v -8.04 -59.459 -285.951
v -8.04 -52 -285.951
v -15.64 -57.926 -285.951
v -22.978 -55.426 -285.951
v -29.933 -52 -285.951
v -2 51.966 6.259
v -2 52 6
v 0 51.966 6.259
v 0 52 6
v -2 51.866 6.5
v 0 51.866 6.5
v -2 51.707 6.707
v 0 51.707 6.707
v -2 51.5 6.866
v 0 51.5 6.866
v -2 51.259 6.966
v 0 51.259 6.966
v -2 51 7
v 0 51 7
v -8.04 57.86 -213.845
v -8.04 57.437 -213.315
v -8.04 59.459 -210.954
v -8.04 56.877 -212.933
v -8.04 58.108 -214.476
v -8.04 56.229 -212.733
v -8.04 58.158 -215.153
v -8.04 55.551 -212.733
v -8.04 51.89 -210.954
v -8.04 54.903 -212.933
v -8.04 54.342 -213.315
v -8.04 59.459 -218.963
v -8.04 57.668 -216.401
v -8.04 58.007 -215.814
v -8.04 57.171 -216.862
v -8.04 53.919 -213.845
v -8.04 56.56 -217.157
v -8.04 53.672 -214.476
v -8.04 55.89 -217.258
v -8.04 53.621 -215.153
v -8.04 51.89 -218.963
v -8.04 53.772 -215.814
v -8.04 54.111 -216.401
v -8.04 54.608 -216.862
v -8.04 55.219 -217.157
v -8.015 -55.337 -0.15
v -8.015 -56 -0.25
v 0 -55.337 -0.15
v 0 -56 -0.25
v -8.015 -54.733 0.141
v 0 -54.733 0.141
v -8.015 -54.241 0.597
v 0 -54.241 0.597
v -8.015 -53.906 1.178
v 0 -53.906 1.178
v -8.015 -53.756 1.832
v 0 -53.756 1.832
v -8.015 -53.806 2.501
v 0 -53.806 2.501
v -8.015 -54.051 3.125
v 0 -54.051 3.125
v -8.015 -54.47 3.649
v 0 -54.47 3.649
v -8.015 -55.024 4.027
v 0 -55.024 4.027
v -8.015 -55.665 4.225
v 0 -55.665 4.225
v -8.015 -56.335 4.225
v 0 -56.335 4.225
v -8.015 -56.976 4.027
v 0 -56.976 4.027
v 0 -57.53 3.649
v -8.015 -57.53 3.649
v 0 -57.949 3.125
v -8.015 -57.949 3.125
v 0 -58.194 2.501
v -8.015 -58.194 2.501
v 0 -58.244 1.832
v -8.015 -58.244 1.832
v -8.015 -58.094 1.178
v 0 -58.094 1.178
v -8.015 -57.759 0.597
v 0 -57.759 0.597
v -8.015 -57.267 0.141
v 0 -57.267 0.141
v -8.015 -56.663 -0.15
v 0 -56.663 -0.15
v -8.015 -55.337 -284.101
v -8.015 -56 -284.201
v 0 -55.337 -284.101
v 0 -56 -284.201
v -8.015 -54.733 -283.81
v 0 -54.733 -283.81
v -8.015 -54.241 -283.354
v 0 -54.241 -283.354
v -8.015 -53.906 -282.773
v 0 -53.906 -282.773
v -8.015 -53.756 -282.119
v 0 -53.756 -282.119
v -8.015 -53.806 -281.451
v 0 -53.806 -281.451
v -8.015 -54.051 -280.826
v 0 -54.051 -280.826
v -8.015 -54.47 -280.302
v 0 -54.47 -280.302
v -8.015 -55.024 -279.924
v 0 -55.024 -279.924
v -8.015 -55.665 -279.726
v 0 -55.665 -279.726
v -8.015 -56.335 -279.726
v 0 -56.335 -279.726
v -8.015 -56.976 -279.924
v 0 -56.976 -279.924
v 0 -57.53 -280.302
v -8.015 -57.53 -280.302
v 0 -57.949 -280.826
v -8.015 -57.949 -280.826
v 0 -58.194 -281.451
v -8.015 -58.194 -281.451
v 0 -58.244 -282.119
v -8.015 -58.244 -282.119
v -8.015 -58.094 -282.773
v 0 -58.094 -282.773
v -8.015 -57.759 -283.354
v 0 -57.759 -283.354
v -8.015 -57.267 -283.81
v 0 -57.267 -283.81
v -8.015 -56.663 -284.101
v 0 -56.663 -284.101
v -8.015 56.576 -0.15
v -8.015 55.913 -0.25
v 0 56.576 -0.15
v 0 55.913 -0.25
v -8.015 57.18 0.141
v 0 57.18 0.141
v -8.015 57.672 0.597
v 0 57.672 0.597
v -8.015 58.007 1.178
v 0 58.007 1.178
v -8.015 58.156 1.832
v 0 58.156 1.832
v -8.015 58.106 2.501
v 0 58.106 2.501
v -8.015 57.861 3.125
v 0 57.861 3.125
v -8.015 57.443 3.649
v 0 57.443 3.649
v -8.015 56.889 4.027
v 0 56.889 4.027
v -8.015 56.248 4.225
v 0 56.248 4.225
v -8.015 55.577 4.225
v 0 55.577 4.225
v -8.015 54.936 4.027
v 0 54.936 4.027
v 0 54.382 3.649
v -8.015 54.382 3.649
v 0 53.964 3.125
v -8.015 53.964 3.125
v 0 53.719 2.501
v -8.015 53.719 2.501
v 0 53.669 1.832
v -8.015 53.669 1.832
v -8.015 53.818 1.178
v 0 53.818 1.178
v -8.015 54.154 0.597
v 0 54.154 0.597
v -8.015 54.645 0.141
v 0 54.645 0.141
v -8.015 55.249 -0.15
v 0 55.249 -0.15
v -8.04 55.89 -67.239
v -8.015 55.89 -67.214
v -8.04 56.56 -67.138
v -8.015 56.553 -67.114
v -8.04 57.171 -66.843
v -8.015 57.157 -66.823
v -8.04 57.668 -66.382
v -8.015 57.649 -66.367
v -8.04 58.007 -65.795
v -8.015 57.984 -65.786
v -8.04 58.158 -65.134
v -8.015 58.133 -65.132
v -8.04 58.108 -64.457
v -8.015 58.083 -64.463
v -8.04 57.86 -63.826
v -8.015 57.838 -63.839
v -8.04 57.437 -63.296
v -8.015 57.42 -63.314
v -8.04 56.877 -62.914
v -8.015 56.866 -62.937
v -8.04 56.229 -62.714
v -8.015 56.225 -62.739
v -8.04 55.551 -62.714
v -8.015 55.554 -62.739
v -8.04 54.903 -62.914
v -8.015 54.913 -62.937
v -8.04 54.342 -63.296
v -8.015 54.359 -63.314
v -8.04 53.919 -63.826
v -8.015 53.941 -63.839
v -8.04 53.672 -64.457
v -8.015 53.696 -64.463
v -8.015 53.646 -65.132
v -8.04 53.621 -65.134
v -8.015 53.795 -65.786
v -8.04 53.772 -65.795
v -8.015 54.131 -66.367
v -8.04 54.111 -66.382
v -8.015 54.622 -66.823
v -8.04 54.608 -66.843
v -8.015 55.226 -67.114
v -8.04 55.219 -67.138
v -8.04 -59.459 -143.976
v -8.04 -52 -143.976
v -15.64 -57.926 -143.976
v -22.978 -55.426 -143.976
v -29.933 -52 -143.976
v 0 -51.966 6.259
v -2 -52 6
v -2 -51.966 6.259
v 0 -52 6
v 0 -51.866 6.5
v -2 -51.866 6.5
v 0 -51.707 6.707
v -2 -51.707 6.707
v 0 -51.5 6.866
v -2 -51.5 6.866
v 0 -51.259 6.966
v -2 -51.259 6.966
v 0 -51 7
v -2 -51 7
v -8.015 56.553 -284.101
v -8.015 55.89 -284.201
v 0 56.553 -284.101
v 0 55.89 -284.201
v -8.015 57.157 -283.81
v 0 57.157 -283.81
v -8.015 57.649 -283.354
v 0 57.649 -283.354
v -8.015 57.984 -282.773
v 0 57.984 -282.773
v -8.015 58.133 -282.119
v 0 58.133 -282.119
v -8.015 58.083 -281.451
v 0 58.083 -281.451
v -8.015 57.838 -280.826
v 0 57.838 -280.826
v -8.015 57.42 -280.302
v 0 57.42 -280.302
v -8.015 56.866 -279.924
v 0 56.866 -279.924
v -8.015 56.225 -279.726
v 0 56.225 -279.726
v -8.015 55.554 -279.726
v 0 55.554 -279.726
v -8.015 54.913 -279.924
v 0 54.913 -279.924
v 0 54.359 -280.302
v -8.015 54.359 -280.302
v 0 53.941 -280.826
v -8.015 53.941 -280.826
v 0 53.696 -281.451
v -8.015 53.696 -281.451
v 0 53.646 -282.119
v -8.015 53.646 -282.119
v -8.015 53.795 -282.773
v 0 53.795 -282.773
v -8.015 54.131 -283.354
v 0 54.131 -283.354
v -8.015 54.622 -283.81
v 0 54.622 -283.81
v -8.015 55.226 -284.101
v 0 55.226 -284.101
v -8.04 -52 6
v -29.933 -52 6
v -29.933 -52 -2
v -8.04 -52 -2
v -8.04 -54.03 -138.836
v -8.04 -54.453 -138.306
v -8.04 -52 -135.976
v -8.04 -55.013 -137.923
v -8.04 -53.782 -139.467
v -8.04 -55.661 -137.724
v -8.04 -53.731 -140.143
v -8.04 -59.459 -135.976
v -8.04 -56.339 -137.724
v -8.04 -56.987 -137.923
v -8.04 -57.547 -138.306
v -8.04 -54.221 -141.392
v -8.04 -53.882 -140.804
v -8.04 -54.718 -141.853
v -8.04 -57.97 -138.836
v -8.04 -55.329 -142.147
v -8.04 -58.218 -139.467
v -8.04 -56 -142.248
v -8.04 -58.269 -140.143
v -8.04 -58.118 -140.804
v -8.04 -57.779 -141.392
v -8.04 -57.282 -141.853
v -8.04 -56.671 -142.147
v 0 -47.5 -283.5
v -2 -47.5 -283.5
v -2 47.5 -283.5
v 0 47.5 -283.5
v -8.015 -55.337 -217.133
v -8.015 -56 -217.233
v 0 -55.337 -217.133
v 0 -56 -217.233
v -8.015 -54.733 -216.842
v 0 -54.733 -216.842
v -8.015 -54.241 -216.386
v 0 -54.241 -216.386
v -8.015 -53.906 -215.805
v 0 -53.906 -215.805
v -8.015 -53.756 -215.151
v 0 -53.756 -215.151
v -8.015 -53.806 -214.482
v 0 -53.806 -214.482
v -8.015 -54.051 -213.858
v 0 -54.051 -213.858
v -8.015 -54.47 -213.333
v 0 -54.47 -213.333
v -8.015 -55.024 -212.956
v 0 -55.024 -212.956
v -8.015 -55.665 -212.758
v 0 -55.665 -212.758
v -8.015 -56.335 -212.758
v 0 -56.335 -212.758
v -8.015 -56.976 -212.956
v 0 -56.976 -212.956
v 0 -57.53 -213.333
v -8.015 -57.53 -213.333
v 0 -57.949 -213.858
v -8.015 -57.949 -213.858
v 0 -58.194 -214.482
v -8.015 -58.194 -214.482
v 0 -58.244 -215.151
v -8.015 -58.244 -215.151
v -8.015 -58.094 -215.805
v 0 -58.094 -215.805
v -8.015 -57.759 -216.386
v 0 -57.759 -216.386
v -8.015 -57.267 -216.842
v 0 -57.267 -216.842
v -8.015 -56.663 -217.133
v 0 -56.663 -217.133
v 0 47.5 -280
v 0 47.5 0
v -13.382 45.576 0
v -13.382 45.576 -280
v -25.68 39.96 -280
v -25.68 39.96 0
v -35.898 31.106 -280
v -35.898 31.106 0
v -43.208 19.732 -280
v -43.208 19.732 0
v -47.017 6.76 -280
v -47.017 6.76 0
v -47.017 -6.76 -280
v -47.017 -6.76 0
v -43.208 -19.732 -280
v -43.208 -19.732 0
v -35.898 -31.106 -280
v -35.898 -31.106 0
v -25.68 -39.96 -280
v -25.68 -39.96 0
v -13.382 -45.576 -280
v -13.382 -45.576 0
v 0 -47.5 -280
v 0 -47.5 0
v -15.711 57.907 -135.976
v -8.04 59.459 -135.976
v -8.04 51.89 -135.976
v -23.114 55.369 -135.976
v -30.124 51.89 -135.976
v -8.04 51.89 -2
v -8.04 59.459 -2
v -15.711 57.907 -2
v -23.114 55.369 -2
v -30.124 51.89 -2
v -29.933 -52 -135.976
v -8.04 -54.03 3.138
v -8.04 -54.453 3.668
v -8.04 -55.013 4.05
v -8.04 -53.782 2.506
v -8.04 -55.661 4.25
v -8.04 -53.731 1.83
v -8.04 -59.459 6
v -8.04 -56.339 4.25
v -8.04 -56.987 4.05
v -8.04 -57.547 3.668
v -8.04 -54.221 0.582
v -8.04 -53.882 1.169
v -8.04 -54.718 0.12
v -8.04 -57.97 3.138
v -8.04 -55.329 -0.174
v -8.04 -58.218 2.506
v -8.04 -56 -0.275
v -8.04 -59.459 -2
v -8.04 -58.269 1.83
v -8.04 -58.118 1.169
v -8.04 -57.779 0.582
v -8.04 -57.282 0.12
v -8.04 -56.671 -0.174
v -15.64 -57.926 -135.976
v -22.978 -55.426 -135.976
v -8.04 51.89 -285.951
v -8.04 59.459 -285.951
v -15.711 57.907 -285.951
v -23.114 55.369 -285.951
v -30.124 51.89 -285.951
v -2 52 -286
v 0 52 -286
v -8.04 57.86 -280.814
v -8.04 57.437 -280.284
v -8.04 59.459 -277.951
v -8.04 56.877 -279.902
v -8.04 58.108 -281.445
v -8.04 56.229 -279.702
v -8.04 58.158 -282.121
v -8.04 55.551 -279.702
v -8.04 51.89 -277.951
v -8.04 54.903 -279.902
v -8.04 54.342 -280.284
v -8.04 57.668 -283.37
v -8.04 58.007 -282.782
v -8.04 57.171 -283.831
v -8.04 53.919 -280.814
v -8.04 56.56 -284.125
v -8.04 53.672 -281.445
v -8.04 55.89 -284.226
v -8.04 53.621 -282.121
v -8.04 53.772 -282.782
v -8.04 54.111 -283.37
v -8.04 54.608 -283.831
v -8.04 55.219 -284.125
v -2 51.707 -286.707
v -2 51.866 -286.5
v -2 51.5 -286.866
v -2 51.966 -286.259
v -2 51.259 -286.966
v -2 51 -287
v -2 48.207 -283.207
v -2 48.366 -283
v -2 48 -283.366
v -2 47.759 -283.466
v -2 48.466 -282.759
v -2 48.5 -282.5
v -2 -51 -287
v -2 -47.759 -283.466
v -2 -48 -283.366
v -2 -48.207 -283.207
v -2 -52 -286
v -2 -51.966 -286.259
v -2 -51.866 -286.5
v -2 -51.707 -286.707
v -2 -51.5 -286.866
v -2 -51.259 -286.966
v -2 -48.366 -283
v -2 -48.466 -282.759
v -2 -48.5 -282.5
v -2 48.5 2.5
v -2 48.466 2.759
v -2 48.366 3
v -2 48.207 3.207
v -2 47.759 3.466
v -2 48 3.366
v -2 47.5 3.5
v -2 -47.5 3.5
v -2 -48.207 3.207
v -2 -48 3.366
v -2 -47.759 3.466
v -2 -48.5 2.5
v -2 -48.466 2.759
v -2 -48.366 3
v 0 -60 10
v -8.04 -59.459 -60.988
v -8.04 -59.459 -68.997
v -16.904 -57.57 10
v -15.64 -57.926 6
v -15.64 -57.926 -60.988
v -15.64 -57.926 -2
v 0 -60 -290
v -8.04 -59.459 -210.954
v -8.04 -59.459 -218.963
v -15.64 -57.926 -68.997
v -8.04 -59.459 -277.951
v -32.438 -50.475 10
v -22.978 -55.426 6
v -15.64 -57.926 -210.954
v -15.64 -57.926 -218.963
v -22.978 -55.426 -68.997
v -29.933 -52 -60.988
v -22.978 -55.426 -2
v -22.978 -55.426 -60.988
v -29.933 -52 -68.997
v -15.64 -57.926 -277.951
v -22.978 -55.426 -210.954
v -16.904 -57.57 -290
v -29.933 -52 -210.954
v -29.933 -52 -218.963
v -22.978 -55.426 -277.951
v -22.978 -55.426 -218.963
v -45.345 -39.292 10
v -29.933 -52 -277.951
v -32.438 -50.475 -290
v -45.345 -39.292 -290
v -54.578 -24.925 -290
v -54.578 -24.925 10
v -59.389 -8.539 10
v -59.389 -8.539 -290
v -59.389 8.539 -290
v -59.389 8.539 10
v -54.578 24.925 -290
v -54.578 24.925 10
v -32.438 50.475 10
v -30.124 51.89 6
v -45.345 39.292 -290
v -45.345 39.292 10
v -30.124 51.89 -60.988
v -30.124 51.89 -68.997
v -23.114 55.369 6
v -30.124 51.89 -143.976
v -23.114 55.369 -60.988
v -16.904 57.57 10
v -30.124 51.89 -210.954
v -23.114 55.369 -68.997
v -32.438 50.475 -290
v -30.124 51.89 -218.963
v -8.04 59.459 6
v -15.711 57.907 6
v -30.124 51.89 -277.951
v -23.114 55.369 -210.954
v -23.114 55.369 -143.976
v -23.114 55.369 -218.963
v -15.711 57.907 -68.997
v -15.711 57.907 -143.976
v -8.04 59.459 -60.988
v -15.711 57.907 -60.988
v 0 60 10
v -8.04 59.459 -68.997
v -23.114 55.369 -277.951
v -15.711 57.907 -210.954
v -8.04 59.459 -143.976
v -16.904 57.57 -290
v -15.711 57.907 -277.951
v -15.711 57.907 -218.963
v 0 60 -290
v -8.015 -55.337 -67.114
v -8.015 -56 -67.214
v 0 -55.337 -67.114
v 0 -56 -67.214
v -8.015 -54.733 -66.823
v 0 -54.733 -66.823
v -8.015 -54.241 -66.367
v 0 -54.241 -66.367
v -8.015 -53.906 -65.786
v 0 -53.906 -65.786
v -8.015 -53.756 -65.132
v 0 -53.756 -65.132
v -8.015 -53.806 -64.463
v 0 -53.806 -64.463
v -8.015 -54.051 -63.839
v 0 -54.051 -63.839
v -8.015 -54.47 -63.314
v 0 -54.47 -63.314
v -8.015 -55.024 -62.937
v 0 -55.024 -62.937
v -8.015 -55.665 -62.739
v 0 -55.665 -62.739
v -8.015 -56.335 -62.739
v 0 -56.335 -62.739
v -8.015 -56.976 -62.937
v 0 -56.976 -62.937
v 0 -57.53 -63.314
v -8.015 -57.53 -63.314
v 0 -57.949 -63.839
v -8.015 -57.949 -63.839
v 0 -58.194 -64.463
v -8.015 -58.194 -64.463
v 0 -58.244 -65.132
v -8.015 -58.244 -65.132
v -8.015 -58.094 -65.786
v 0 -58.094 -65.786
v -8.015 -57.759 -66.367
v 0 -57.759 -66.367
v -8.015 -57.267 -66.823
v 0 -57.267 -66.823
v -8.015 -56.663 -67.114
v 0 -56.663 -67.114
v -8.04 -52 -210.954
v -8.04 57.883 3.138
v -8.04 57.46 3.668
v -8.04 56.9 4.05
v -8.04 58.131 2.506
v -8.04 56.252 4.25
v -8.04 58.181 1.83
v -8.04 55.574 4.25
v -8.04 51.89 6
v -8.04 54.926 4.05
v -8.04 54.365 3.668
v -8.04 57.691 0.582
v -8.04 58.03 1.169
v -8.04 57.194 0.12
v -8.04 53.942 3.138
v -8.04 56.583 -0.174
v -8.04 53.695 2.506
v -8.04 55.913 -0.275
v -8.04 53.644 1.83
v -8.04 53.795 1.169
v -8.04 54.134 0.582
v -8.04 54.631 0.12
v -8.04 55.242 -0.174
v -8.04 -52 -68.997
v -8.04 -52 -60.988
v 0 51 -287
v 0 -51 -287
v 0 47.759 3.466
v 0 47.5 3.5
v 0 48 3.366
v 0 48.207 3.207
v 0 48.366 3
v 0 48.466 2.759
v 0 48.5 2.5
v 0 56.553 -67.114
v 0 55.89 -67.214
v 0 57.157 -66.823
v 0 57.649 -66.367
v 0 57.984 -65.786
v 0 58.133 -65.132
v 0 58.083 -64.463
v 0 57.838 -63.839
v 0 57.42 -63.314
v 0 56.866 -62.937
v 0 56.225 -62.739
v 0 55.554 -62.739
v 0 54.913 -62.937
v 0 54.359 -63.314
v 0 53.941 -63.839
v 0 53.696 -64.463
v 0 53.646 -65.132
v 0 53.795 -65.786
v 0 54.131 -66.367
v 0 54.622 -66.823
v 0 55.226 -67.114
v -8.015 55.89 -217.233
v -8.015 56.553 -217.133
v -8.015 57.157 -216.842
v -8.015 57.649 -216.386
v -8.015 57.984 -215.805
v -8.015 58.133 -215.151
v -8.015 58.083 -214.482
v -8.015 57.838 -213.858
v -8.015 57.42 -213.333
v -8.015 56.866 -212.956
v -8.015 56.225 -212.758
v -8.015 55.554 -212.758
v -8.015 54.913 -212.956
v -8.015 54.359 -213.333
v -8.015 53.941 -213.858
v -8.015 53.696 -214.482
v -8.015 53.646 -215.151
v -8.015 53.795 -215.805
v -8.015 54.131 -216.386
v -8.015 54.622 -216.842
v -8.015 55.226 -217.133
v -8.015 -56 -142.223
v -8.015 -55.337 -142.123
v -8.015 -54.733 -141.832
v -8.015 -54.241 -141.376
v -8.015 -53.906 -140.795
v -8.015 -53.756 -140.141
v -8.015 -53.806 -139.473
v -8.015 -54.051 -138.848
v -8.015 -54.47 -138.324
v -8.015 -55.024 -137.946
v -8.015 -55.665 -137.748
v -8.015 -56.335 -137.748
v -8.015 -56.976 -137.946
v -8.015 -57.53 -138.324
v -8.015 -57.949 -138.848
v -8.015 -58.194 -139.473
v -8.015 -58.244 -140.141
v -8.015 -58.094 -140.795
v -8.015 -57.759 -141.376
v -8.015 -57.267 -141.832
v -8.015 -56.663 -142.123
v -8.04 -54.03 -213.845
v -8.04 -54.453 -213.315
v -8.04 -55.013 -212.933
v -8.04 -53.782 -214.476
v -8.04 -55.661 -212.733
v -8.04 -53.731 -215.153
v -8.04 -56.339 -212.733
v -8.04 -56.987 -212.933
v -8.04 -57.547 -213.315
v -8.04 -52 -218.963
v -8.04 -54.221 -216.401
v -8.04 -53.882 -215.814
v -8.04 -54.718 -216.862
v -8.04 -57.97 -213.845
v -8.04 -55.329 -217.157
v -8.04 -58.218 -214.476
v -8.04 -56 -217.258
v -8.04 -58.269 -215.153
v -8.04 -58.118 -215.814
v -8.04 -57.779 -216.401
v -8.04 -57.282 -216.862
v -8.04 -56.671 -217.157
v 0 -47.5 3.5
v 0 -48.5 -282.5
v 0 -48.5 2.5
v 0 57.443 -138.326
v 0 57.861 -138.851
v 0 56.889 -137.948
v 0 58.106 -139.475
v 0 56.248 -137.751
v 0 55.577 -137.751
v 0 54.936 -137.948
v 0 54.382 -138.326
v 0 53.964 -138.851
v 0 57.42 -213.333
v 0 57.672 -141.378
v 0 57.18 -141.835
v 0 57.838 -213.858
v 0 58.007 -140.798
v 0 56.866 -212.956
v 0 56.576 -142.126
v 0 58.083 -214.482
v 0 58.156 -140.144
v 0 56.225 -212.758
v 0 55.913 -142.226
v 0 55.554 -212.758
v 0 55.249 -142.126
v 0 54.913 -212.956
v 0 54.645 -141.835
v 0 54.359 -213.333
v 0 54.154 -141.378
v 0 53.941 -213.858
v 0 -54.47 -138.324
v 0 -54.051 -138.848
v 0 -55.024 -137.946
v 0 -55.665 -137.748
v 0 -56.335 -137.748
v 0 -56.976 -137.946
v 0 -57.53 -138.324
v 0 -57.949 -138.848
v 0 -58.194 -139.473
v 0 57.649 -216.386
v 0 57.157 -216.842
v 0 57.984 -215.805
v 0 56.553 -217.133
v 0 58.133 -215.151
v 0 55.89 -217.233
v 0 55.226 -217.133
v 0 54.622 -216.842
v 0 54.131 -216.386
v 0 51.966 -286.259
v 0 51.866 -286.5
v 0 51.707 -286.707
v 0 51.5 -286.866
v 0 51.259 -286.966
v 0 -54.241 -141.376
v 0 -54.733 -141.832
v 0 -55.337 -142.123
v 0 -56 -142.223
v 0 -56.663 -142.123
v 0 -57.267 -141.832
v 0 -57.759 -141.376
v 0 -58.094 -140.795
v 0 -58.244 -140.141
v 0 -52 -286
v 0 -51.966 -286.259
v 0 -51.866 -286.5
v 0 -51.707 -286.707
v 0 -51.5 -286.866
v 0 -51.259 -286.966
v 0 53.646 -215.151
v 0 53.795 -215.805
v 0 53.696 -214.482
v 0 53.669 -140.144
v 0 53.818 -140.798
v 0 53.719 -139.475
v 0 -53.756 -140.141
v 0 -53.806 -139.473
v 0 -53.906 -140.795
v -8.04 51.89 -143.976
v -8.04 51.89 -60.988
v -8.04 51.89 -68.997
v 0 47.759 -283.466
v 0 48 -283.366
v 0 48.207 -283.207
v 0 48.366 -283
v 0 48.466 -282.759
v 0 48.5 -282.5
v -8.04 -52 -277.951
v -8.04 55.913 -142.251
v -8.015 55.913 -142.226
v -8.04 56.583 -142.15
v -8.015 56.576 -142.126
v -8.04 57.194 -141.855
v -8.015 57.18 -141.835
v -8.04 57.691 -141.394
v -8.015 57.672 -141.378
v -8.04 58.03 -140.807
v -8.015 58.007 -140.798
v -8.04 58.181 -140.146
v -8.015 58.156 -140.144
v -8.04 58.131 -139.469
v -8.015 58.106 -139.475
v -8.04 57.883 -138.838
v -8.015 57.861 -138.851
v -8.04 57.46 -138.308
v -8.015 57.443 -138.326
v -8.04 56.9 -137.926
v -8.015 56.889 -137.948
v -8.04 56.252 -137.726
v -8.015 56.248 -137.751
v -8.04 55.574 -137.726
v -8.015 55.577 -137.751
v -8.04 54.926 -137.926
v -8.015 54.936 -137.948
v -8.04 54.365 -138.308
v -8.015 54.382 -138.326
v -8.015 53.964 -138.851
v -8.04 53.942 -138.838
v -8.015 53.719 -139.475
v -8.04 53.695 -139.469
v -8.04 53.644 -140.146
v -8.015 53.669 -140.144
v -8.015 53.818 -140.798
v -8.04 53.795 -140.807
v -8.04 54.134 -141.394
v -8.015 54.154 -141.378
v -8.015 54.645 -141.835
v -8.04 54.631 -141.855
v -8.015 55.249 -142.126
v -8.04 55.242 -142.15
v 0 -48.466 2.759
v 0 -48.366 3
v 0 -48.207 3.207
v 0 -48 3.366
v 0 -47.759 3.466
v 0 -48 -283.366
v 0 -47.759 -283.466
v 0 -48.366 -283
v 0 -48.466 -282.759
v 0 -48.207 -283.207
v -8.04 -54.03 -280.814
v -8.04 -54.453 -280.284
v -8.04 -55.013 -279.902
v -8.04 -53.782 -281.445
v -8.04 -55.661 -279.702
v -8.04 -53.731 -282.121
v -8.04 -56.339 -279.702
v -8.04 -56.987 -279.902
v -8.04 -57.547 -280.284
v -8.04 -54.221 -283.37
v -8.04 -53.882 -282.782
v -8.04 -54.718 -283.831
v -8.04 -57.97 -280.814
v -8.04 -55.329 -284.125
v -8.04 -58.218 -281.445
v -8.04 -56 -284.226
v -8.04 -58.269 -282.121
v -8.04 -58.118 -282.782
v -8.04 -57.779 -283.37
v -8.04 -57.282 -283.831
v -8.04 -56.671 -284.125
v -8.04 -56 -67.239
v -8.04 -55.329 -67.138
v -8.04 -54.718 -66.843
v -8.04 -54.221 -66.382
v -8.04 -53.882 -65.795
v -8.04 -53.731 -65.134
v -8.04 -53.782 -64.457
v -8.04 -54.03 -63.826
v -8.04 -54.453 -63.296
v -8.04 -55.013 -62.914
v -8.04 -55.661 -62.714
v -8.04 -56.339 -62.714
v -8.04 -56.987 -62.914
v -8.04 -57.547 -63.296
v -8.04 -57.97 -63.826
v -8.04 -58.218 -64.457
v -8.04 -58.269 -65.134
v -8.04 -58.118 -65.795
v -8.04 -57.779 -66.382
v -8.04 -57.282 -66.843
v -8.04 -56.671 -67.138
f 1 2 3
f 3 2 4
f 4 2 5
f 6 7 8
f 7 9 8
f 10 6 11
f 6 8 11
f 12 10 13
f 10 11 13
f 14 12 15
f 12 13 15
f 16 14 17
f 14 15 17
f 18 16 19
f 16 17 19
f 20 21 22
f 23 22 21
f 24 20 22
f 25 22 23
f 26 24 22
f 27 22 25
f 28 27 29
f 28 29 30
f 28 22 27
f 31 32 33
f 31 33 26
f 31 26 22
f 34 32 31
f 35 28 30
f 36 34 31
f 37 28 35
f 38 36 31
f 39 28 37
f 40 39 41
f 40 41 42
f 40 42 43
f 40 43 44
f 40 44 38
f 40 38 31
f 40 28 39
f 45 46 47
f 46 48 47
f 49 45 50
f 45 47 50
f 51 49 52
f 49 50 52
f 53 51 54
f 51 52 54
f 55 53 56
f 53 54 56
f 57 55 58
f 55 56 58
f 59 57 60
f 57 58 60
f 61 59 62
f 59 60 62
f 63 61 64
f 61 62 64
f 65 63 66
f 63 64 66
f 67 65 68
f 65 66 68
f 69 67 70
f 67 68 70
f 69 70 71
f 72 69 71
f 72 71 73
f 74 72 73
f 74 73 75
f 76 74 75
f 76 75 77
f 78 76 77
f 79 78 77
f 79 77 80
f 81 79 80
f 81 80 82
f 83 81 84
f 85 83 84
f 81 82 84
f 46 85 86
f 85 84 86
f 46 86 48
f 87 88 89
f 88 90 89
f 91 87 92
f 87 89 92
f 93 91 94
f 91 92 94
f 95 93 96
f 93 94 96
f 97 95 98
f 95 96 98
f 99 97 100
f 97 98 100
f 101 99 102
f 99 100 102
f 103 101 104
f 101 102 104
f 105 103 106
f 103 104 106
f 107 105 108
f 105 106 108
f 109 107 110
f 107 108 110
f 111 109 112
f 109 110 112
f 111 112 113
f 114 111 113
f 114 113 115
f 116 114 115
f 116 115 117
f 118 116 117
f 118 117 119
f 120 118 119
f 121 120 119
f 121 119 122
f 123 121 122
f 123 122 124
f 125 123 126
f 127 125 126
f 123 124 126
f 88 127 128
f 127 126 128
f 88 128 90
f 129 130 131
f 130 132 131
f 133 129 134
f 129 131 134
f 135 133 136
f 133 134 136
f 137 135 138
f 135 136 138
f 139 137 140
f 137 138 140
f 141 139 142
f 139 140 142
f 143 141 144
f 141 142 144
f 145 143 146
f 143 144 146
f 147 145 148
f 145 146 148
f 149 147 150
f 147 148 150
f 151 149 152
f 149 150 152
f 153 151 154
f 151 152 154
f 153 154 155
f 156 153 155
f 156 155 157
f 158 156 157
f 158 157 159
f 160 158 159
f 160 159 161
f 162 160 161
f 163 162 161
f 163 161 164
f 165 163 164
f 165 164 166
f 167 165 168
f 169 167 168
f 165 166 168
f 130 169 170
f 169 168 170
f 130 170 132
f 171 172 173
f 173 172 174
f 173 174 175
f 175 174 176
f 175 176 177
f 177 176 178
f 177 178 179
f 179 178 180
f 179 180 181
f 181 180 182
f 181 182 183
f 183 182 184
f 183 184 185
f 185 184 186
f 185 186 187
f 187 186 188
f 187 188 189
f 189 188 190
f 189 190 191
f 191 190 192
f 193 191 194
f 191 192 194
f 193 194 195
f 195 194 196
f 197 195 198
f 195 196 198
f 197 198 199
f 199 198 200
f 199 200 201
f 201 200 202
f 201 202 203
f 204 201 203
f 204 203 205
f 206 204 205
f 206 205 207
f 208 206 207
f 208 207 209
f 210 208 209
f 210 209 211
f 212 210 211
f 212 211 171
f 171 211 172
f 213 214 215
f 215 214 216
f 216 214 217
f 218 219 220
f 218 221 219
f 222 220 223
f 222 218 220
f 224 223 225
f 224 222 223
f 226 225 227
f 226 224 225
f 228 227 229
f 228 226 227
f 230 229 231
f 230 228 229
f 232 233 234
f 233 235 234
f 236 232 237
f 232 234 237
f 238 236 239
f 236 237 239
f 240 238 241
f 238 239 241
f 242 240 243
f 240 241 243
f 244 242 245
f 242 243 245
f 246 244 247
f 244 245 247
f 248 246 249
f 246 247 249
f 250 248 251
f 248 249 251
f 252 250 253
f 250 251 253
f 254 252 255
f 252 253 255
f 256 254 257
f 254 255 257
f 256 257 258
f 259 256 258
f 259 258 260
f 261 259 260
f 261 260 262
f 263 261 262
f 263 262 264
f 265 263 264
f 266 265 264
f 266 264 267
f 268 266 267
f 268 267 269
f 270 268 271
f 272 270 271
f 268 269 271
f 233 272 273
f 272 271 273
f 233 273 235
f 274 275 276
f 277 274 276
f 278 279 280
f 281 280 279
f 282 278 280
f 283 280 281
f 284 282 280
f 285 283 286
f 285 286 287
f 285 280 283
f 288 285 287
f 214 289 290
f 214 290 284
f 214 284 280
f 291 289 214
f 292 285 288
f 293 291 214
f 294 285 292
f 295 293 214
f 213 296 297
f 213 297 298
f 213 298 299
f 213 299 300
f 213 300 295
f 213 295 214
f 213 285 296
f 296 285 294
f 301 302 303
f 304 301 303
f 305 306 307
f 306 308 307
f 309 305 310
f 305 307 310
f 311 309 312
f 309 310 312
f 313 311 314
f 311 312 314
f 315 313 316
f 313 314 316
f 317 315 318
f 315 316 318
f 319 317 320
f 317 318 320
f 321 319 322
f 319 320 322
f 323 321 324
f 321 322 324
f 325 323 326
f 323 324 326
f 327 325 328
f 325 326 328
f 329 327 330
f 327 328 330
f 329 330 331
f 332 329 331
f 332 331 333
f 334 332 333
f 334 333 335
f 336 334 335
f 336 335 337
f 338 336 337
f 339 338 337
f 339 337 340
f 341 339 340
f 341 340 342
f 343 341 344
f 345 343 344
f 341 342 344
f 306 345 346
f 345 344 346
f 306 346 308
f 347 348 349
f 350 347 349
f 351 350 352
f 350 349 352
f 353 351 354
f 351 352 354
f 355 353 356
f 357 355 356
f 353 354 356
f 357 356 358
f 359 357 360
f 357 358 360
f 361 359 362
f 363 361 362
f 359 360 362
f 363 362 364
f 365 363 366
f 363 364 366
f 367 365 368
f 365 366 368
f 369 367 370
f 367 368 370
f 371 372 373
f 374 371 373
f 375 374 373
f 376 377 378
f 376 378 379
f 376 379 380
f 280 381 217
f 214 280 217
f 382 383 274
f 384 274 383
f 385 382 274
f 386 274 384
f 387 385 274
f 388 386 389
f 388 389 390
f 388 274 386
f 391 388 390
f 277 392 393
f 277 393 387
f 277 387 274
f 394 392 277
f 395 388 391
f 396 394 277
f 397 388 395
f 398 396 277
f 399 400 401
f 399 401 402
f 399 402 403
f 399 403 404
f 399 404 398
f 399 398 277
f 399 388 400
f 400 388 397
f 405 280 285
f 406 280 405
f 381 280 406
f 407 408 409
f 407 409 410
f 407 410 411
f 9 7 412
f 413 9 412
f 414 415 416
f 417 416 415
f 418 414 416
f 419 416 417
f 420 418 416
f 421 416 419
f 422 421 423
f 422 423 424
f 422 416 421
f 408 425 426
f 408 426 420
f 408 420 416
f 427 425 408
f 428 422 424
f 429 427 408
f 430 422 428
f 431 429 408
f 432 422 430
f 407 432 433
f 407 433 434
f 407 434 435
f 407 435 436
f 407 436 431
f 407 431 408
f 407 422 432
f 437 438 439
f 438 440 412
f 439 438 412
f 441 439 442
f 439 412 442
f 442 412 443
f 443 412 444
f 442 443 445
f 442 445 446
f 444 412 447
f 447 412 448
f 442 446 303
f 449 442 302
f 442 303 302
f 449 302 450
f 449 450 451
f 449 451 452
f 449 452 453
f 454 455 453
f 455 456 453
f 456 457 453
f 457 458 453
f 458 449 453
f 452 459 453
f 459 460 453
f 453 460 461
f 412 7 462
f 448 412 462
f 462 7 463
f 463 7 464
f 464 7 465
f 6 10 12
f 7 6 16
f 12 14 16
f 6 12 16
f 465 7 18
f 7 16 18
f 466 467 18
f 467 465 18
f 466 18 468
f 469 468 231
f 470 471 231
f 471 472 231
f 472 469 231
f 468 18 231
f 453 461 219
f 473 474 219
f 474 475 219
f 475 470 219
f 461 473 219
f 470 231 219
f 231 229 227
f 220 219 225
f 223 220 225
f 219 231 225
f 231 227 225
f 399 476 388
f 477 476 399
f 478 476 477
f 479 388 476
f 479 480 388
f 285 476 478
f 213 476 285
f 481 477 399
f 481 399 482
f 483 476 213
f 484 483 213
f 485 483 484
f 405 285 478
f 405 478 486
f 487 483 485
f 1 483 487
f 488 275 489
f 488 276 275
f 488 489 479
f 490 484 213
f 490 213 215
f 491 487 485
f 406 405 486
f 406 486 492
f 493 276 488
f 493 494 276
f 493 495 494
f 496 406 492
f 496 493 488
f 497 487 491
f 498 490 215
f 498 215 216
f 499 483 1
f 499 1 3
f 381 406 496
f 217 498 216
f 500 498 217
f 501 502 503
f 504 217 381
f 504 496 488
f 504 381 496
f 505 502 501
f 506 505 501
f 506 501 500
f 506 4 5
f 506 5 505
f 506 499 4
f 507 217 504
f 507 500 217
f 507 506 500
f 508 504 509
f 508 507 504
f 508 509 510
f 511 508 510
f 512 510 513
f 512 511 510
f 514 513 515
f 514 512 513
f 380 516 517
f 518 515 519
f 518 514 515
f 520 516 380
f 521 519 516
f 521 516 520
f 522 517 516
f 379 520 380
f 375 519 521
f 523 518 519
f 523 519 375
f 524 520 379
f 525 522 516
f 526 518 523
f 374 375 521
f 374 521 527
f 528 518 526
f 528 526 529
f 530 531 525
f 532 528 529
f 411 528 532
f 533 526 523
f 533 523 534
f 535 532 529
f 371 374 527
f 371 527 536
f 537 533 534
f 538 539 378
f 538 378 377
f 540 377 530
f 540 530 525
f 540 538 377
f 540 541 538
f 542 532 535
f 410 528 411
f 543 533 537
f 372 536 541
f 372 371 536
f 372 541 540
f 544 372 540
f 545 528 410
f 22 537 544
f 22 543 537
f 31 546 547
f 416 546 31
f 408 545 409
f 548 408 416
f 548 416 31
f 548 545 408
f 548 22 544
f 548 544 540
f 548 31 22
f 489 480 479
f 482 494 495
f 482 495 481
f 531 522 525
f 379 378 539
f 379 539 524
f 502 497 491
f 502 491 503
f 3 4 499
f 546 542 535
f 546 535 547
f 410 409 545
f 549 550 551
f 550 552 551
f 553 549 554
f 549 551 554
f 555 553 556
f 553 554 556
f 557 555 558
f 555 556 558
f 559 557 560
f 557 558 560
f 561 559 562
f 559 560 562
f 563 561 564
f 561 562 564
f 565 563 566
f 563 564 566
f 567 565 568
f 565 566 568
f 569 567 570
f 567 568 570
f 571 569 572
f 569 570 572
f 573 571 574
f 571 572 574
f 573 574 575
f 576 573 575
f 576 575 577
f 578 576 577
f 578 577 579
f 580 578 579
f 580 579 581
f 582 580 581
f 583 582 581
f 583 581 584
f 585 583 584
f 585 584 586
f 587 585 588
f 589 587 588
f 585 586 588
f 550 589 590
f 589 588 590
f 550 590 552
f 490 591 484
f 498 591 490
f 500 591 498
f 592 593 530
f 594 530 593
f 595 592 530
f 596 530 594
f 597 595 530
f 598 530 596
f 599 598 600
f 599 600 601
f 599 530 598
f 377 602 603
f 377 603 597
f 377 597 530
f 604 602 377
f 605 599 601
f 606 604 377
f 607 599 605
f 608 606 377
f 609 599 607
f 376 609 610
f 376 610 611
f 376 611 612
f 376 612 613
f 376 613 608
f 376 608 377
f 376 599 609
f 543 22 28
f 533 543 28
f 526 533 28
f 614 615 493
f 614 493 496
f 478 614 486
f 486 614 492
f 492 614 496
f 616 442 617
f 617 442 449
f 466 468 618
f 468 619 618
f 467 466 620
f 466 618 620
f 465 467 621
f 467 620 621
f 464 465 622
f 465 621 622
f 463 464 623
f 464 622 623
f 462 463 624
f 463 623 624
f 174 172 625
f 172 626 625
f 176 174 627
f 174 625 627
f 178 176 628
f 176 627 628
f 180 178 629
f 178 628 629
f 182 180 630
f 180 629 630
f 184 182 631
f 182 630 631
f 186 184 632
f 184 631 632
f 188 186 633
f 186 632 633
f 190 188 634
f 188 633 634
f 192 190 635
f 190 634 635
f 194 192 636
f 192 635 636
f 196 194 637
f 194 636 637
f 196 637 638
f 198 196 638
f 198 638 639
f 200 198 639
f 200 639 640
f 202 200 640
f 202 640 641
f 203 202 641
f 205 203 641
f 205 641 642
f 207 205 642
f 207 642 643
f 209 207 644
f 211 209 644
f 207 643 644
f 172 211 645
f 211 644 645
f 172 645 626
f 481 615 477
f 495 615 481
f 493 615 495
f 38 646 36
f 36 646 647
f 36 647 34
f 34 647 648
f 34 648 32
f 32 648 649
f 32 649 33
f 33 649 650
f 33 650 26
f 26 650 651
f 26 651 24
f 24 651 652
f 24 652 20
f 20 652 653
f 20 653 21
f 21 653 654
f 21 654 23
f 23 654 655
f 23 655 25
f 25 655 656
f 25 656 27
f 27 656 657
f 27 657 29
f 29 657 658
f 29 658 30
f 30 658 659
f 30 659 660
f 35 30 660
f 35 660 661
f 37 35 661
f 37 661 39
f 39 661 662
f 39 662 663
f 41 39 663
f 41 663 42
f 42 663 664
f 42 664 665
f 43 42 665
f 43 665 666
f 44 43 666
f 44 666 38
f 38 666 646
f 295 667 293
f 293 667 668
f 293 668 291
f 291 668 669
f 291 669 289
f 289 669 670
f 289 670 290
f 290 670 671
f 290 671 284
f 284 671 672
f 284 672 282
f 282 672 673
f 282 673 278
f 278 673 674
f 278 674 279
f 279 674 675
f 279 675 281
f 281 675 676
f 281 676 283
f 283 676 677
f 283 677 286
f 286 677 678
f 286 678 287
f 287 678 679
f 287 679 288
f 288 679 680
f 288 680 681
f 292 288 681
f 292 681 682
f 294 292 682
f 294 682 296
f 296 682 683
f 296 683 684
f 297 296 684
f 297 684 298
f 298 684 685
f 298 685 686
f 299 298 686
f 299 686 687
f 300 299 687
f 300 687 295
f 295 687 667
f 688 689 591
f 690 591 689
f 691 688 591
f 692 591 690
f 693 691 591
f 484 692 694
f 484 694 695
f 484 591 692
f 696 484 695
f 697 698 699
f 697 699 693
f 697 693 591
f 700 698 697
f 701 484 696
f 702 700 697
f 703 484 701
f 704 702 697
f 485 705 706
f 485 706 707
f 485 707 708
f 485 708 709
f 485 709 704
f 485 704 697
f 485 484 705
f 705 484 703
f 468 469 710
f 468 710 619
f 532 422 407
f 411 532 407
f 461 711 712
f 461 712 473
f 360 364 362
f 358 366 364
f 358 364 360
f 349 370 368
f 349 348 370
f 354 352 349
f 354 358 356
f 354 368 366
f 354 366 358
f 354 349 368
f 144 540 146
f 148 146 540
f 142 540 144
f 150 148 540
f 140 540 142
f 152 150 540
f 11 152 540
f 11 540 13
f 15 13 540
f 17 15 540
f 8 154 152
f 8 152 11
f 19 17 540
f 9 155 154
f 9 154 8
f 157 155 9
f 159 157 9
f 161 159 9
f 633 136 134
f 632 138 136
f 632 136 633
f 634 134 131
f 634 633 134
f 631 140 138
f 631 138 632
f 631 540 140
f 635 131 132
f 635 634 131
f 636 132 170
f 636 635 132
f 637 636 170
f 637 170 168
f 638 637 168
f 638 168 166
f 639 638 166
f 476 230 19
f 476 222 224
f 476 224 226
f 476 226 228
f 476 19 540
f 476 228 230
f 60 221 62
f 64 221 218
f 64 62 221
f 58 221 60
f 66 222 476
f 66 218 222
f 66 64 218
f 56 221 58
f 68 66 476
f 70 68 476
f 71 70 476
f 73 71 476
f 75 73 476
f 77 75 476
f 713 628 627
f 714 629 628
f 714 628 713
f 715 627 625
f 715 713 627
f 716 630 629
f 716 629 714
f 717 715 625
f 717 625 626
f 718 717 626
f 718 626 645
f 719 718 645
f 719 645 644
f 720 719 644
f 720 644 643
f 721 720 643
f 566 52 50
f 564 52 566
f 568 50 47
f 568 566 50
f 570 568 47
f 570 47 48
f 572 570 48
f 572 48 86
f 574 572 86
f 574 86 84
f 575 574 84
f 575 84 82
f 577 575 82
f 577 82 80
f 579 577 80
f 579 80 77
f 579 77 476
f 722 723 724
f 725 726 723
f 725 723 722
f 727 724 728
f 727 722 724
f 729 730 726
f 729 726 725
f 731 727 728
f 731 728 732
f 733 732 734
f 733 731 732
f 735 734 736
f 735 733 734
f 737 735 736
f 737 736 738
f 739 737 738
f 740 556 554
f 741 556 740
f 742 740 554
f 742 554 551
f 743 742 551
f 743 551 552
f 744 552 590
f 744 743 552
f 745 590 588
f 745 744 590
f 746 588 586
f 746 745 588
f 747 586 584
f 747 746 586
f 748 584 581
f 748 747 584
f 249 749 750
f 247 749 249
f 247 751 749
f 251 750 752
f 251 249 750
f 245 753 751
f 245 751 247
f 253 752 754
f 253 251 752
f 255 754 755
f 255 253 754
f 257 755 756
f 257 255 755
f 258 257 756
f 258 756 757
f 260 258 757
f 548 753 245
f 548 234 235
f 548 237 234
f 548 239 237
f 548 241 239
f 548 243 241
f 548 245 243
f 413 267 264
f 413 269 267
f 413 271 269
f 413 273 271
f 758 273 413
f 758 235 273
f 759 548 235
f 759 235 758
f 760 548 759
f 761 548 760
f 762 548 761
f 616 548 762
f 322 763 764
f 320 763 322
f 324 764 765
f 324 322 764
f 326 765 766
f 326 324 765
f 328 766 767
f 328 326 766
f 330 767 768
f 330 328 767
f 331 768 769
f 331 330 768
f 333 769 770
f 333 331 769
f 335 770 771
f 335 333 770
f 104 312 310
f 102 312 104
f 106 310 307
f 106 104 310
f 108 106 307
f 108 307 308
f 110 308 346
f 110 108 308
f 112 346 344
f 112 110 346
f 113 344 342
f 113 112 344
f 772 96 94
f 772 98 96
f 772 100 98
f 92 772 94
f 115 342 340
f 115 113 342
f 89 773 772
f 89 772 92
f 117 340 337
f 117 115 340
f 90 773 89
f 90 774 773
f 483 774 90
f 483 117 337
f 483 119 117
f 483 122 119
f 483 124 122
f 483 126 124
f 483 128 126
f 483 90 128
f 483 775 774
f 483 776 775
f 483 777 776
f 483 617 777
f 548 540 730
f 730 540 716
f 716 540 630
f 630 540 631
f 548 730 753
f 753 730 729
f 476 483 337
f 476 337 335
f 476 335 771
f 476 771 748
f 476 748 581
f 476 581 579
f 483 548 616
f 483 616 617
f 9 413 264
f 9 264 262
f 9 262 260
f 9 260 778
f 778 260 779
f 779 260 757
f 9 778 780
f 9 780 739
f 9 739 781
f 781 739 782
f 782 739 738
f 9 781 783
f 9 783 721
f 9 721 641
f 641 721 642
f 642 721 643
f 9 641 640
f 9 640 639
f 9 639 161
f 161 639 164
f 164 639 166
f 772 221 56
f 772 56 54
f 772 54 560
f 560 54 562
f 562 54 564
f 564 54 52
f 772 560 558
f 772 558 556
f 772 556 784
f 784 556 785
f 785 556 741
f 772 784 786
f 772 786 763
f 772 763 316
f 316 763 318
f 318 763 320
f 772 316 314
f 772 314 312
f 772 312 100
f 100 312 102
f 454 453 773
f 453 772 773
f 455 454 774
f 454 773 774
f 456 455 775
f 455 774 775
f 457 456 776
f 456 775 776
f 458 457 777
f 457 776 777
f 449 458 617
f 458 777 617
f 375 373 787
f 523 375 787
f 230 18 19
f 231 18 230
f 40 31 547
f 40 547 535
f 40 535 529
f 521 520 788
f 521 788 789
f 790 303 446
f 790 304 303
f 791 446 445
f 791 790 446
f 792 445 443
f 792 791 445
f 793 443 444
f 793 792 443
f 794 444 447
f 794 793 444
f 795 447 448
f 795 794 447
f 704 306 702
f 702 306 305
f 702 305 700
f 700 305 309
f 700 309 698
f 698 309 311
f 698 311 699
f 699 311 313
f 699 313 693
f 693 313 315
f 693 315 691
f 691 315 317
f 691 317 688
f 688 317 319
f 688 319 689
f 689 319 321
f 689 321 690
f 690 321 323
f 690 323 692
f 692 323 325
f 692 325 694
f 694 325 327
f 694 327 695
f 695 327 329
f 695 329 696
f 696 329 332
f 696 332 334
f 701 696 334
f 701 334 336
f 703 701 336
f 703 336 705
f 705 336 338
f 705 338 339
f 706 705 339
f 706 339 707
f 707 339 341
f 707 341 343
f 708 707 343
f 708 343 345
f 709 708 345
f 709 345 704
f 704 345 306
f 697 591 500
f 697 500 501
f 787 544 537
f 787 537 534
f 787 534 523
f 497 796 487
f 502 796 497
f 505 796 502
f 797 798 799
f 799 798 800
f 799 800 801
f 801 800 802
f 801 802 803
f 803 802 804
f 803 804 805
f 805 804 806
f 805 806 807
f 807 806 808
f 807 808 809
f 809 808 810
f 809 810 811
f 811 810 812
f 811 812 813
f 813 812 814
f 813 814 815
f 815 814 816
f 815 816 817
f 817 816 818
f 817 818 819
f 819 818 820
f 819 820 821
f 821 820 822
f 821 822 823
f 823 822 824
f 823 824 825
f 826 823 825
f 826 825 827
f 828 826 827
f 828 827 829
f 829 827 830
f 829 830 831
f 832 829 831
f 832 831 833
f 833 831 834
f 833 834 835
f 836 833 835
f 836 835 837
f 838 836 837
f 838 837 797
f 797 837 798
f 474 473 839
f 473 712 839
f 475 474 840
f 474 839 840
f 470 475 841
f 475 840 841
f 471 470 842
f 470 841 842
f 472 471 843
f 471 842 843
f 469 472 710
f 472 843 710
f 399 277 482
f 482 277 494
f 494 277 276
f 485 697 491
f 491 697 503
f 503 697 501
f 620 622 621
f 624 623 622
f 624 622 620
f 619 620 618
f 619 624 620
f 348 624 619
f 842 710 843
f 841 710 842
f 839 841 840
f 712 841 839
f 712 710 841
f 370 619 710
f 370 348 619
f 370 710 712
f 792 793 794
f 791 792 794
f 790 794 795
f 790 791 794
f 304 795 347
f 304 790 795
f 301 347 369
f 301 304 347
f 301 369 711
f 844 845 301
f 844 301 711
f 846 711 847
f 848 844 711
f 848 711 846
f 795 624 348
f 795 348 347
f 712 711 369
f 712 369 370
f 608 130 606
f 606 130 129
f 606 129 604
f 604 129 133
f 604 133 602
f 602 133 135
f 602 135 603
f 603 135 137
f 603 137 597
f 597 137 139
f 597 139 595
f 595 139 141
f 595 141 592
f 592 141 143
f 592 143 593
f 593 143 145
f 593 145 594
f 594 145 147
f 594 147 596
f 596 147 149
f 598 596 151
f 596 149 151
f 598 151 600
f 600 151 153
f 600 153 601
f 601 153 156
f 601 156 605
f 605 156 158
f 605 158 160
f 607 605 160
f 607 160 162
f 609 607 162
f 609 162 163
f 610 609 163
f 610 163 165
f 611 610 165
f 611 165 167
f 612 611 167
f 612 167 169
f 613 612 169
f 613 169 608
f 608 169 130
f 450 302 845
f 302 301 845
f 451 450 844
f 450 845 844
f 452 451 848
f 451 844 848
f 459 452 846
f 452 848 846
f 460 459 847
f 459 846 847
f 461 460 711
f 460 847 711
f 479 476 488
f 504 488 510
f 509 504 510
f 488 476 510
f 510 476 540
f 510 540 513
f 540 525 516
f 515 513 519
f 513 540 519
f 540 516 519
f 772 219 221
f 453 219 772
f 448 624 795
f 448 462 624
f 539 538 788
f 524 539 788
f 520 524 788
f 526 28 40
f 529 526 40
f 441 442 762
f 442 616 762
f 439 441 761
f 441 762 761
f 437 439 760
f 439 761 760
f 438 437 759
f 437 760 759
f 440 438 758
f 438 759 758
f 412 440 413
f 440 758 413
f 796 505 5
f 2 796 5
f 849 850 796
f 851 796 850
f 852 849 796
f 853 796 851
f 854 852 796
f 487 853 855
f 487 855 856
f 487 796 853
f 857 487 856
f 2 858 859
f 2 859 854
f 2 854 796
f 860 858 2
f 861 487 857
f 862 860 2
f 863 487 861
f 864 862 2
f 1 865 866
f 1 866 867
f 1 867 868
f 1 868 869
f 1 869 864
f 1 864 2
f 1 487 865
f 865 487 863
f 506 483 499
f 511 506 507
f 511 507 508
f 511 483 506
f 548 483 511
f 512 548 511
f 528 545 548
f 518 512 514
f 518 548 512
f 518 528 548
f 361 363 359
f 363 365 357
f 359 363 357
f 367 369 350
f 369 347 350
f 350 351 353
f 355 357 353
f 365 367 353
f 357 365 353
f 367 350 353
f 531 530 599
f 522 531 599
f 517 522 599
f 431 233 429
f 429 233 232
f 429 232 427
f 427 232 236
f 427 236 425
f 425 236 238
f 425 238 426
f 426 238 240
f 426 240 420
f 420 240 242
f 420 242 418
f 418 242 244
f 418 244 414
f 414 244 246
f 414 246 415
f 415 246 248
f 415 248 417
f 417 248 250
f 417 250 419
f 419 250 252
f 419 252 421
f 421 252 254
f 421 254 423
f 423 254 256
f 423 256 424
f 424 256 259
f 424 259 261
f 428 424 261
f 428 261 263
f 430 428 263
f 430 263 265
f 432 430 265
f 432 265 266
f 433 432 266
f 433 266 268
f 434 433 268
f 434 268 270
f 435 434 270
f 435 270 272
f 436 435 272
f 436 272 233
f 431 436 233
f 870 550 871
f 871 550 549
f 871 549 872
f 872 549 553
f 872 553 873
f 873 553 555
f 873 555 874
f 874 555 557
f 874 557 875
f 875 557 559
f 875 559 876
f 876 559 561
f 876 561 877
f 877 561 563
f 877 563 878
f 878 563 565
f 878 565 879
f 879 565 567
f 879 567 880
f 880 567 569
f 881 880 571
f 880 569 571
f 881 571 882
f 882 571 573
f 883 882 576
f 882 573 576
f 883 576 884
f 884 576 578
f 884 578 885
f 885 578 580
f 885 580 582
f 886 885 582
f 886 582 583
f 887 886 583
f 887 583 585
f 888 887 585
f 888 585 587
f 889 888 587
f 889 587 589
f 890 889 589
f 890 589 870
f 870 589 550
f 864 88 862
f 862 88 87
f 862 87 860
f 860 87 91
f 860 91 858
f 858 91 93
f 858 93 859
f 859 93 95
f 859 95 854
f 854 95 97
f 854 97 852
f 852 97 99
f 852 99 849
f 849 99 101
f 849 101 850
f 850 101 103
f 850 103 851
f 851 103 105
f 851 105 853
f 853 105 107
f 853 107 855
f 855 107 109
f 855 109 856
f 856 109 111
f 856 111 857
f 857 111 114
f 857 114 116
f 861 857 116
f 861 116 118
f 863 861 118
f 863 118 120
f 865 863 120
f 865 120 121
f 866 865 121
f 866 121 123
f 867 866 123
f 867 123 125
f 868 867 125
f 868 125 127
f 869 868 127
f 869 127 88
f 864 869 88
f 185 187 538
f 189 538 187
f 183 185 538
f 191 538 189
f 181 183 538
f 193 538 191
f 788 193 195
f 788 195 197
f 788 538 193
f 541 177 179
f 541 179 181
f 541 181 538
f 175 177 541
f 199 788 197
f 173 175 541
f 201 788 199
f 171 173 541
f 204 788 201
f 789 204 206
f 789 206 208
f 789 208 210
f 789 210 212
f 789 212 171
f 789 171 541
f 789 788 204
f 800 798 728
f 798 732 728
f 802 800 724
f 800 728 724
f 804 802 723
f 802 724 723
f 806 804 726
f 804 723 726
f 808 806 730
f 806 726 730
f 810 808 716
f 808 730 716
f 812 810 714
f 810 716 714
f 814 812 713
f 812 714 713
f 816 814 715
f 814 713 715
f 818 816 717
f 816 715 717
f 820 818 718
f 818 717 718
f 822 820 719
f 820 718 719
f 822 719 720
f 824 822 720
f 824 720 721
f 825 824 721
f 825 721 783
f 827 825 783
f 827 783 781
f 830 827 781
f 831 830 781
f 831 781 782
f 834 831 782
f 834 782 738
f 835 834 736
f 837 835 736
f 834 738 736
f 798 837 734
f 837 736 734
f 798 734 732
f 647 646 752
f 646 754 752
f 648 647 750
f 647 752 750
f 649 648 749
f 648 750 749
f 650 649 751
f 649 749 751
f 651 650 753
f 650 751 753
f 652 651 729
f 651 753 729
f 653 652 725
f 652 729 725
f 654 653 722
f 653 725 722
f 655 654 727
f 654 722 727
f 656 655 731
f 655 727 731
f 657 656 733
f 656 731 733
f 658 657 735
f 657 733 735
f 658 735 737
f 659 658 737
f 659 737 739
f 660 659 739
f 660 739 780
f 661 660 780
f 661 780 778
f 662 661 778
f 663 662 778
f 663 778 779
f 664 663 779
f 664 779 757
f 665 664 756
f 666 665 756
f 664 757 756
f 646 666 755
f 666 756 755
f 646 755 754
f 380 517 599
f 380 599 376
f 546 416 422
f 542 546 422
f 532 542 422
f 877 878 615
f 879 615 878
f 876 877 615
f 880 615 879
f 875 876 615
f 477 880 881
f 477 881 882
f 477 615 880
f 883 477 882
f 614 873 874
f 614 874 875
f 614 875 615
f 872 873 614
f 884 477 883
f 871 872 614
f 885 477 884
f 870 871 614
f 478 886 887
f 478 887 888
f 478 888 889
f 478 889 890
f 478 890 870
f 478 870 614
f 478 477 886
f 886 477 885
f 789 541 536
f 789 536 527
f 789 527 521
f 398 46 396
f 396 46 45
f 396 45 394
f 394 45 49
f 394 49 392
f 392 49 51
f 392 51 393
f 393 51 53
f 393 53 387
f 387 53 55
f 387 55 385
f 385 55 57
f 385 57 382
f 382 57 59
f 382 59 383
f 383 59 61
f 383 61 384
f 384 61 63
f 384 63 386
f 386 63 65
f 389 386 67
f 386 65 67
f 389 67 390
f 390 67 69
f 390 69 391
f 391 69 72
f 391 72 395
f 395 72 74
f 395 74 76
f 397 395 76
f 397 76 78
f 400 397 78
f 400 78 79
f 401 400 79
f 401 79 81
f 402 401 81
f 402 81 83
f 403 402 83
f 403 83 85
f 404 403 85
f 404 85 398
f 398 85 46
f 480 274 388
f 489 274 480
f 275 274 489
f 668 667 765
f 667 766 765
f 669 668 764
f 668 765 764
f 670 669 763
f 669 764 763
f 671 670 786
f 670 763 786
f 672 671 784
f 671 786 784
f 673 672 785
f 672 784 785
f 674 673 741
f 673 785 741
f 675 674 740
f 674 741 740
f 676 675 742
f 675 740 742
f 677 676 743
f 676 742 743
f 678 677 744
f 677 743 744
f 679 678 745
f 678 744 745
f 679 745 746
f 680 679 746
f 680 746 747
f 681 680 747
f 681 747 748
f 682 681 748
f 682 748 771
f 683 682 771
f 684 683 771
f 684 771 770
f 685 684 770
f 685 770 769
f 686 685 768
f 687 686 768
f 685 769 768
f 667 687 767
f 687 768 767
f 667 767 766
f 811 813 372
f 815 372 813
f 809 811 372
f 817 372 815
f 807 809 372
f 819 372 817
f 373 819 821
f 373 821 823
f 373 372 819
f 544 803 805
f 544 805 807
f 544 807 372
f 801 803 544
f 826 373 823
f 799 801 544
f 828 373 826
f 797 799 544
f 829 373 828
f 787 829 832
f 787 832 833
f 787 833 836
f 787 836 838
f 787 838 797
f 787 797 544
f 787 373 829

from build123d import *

# Parameters (mm, degrees)
BOSS_EXTRUDE1_DEPTH            = 280
BOSS_EXTRUDE3_START            = 10
BOSS_EXTRUDE3_DEPTH            = 10
CUT_EXTRUDE_THIN1_START        = -2
CUT_EXTRUDE_THIN1_DEPTH        = 2
FILLET6_R                      = 1
SKETCH11_W                     = 8
SKETCH11_H                     = 8
SKETCH11_W_2                   = 8.009527264
CUT_EXTRUDE1_DEPTH             = 51
M4_CLEARANCE_HOLE1_D           = 4.5
M4_CLEARANCE_HOLE1_CSINK_D     = 4.55
M4_CLEARANCE_HOLE1_CSINK_ANGLE = 90


# Read off the part's stored shape, not the designer's step: Cut-Extrude-Thin1
with BuildPart() as part:
    # Sketch1 → Boss-Extrude1 (new body)
    with BuildSketch(Plane.XY):
        with BuildLine():
            Line((0, 52), (-2, 52))
            Line((-2, 52), (-2, 48.5))
            Line((-2, 48.5), (0, 48.5))
            Line((0, 48.5), (0, 47.5))
            ThreePointArc((0, 47.5), (-47.5, 0), (0, -47.5))
            Line((0, -47.5), (0, -48.5))
            Line((0, -48.5), (-2, -48.5))
            Line((-2, -48.5), (-2, -52))
            Line((-2, -52), (0, -52))
            Line((0, -52), (0, -60))
            ThreePointArc((0, -60), (-60, 0), (0, 60))
            Line((0, 60), (0, 52))
        make_face()
    extrude(amount=-BOSS_EXTRUDE1_DEPTH)

    # Sketch7 → Boss-Extrude3 (add)
    with BuildSketch(Plane.XY.offset(BOSS_EXTRUDE3_START)):
        with BuildLine():
            Line((0, 60), (0, -60))
            ThreePointArc((0, -60), (-60, 0), (0, 60))
        make_face()
    boss_extrude3 = extrude(amount=-BOSS_EXTRUDE3_DEPTH)

    # Mirror1: Boss-Extrude3 across plane
    add(boss_extrude3.mirror(Plane.XY.offset(-140)))

    # Cut-Extrude-Thin1 outline → Cut-Extrude-Thin1 (cut)
    with BuildSketch(Plane(origin=(0, 0, 0), x_dir=(0, 0, -1), z_dir=(1, 0, 0)).offset(CUT_EXTRUDE_THIN1_START)):
        Polygon((0, 52), (-7, 52), (-7, -52), (0, -52), (0, -48.5), (-3.5, -48.5), (-3.5, 48.5), (0, 48.5), align=None)
    cut_extrude_thin1 = extrude(amount=CUT_EXTRUDE_THIN1_DEPTH, mode=Mode.SUBTRACT)

    # Mirror2: Cut-Extrude-Thin1 across plane
    add(cut_extrude_thin1.mirror(Plane.XY.offset(-140)), mode=Mode.SUBTRACT)

    # Fillet6
    fillet6_edges = [part.edges().sort_by_distance(p)[0] for p in [
        (-1, -52, 7),
        (-1, 52, 7),
        (-1, 48.5, 3.5),
        (-1, -48.5, 3.5),
        (-1, -52, -287),
        (-1, -48.5, -283.5),
        (-1, 48.5, -283.5),
        (-1, 52, -287),
    ]]
    fillet(fillet6_edges, radius=FILLET6_R)

    # Sketch11 → Cut-Extrude1 (cut)
    with BuildSketch(Plane(origin=(-59.040249017, 0, 0), x_dir=(0, 0, -1), z_dir=(-1, 0, 0))):
        with Locations((139.975606131, 56)):
            Rectangle(SKETCH11_W, SKETCH11_H)
        with Locations((-2, 56)):
            Rectangle(SKETCH11_W, SKETCH11_H)
        with Locations((-2, -55.889665958)):
            Rectangle(SKETCH11_W, SKETCH11_H)
        with Locations((139.975606131, -55.889665958)):
            Rectangle(SKETCH11_W, SKETCH11_H)
        with Locations((281.951212263, 56)):
            Rectangle(SKETCH11_W, SKETCH11_H)
        with Locations((281.951212263, -55.889665958)):
            Rectangle(SKETCH11_W, SKETCH11_H)
        with Locations((64.992566698, 56)):
            Rectangle(SKETCH11_W_2, SKETCH11_H)
        with Locations((214.958645565, 56)):
            Rectangle(SKETCH11_W_2, SKETCH11_H)
        with Locations((214.958645565, -55.889665958)):
            Rectangle(SKETCH11_W_2, SKETCH11_H)
        with Locations((64.992566698, -55.889665958)):
            Rectangle(SKETCH11_W_2, SKETCH11_H)
    extrude(amount=-CUT_EXTRUDE1_DEPTH, mode=Mode.SUBTRACT)

    # M4 Clearance Hole1 (through all)
    with Locations(Plane.ZY.offset(8.040249017)):
        with Locations((-281.951212263, 55.889665958), (-281.951212263, -56), (-139.973202333, -56), (2, -56), (2, 55.912652005), (-139.975606131, 55.912652005), (-214.982691693, 55.889665958), (-64.963712973, 55.889665958), (-214.982691693, -56), (-64.963712973, -56)):
            CounterSinkHole(M4_CLEARANCE_HOLE1_D / 2, M4_CLEARANCE_HOLE1_CSINK_D / 2, counter_sink_angle=M4_CLEARANCE_HOLE1_CSINK_ANGLE)


solid = part.part
